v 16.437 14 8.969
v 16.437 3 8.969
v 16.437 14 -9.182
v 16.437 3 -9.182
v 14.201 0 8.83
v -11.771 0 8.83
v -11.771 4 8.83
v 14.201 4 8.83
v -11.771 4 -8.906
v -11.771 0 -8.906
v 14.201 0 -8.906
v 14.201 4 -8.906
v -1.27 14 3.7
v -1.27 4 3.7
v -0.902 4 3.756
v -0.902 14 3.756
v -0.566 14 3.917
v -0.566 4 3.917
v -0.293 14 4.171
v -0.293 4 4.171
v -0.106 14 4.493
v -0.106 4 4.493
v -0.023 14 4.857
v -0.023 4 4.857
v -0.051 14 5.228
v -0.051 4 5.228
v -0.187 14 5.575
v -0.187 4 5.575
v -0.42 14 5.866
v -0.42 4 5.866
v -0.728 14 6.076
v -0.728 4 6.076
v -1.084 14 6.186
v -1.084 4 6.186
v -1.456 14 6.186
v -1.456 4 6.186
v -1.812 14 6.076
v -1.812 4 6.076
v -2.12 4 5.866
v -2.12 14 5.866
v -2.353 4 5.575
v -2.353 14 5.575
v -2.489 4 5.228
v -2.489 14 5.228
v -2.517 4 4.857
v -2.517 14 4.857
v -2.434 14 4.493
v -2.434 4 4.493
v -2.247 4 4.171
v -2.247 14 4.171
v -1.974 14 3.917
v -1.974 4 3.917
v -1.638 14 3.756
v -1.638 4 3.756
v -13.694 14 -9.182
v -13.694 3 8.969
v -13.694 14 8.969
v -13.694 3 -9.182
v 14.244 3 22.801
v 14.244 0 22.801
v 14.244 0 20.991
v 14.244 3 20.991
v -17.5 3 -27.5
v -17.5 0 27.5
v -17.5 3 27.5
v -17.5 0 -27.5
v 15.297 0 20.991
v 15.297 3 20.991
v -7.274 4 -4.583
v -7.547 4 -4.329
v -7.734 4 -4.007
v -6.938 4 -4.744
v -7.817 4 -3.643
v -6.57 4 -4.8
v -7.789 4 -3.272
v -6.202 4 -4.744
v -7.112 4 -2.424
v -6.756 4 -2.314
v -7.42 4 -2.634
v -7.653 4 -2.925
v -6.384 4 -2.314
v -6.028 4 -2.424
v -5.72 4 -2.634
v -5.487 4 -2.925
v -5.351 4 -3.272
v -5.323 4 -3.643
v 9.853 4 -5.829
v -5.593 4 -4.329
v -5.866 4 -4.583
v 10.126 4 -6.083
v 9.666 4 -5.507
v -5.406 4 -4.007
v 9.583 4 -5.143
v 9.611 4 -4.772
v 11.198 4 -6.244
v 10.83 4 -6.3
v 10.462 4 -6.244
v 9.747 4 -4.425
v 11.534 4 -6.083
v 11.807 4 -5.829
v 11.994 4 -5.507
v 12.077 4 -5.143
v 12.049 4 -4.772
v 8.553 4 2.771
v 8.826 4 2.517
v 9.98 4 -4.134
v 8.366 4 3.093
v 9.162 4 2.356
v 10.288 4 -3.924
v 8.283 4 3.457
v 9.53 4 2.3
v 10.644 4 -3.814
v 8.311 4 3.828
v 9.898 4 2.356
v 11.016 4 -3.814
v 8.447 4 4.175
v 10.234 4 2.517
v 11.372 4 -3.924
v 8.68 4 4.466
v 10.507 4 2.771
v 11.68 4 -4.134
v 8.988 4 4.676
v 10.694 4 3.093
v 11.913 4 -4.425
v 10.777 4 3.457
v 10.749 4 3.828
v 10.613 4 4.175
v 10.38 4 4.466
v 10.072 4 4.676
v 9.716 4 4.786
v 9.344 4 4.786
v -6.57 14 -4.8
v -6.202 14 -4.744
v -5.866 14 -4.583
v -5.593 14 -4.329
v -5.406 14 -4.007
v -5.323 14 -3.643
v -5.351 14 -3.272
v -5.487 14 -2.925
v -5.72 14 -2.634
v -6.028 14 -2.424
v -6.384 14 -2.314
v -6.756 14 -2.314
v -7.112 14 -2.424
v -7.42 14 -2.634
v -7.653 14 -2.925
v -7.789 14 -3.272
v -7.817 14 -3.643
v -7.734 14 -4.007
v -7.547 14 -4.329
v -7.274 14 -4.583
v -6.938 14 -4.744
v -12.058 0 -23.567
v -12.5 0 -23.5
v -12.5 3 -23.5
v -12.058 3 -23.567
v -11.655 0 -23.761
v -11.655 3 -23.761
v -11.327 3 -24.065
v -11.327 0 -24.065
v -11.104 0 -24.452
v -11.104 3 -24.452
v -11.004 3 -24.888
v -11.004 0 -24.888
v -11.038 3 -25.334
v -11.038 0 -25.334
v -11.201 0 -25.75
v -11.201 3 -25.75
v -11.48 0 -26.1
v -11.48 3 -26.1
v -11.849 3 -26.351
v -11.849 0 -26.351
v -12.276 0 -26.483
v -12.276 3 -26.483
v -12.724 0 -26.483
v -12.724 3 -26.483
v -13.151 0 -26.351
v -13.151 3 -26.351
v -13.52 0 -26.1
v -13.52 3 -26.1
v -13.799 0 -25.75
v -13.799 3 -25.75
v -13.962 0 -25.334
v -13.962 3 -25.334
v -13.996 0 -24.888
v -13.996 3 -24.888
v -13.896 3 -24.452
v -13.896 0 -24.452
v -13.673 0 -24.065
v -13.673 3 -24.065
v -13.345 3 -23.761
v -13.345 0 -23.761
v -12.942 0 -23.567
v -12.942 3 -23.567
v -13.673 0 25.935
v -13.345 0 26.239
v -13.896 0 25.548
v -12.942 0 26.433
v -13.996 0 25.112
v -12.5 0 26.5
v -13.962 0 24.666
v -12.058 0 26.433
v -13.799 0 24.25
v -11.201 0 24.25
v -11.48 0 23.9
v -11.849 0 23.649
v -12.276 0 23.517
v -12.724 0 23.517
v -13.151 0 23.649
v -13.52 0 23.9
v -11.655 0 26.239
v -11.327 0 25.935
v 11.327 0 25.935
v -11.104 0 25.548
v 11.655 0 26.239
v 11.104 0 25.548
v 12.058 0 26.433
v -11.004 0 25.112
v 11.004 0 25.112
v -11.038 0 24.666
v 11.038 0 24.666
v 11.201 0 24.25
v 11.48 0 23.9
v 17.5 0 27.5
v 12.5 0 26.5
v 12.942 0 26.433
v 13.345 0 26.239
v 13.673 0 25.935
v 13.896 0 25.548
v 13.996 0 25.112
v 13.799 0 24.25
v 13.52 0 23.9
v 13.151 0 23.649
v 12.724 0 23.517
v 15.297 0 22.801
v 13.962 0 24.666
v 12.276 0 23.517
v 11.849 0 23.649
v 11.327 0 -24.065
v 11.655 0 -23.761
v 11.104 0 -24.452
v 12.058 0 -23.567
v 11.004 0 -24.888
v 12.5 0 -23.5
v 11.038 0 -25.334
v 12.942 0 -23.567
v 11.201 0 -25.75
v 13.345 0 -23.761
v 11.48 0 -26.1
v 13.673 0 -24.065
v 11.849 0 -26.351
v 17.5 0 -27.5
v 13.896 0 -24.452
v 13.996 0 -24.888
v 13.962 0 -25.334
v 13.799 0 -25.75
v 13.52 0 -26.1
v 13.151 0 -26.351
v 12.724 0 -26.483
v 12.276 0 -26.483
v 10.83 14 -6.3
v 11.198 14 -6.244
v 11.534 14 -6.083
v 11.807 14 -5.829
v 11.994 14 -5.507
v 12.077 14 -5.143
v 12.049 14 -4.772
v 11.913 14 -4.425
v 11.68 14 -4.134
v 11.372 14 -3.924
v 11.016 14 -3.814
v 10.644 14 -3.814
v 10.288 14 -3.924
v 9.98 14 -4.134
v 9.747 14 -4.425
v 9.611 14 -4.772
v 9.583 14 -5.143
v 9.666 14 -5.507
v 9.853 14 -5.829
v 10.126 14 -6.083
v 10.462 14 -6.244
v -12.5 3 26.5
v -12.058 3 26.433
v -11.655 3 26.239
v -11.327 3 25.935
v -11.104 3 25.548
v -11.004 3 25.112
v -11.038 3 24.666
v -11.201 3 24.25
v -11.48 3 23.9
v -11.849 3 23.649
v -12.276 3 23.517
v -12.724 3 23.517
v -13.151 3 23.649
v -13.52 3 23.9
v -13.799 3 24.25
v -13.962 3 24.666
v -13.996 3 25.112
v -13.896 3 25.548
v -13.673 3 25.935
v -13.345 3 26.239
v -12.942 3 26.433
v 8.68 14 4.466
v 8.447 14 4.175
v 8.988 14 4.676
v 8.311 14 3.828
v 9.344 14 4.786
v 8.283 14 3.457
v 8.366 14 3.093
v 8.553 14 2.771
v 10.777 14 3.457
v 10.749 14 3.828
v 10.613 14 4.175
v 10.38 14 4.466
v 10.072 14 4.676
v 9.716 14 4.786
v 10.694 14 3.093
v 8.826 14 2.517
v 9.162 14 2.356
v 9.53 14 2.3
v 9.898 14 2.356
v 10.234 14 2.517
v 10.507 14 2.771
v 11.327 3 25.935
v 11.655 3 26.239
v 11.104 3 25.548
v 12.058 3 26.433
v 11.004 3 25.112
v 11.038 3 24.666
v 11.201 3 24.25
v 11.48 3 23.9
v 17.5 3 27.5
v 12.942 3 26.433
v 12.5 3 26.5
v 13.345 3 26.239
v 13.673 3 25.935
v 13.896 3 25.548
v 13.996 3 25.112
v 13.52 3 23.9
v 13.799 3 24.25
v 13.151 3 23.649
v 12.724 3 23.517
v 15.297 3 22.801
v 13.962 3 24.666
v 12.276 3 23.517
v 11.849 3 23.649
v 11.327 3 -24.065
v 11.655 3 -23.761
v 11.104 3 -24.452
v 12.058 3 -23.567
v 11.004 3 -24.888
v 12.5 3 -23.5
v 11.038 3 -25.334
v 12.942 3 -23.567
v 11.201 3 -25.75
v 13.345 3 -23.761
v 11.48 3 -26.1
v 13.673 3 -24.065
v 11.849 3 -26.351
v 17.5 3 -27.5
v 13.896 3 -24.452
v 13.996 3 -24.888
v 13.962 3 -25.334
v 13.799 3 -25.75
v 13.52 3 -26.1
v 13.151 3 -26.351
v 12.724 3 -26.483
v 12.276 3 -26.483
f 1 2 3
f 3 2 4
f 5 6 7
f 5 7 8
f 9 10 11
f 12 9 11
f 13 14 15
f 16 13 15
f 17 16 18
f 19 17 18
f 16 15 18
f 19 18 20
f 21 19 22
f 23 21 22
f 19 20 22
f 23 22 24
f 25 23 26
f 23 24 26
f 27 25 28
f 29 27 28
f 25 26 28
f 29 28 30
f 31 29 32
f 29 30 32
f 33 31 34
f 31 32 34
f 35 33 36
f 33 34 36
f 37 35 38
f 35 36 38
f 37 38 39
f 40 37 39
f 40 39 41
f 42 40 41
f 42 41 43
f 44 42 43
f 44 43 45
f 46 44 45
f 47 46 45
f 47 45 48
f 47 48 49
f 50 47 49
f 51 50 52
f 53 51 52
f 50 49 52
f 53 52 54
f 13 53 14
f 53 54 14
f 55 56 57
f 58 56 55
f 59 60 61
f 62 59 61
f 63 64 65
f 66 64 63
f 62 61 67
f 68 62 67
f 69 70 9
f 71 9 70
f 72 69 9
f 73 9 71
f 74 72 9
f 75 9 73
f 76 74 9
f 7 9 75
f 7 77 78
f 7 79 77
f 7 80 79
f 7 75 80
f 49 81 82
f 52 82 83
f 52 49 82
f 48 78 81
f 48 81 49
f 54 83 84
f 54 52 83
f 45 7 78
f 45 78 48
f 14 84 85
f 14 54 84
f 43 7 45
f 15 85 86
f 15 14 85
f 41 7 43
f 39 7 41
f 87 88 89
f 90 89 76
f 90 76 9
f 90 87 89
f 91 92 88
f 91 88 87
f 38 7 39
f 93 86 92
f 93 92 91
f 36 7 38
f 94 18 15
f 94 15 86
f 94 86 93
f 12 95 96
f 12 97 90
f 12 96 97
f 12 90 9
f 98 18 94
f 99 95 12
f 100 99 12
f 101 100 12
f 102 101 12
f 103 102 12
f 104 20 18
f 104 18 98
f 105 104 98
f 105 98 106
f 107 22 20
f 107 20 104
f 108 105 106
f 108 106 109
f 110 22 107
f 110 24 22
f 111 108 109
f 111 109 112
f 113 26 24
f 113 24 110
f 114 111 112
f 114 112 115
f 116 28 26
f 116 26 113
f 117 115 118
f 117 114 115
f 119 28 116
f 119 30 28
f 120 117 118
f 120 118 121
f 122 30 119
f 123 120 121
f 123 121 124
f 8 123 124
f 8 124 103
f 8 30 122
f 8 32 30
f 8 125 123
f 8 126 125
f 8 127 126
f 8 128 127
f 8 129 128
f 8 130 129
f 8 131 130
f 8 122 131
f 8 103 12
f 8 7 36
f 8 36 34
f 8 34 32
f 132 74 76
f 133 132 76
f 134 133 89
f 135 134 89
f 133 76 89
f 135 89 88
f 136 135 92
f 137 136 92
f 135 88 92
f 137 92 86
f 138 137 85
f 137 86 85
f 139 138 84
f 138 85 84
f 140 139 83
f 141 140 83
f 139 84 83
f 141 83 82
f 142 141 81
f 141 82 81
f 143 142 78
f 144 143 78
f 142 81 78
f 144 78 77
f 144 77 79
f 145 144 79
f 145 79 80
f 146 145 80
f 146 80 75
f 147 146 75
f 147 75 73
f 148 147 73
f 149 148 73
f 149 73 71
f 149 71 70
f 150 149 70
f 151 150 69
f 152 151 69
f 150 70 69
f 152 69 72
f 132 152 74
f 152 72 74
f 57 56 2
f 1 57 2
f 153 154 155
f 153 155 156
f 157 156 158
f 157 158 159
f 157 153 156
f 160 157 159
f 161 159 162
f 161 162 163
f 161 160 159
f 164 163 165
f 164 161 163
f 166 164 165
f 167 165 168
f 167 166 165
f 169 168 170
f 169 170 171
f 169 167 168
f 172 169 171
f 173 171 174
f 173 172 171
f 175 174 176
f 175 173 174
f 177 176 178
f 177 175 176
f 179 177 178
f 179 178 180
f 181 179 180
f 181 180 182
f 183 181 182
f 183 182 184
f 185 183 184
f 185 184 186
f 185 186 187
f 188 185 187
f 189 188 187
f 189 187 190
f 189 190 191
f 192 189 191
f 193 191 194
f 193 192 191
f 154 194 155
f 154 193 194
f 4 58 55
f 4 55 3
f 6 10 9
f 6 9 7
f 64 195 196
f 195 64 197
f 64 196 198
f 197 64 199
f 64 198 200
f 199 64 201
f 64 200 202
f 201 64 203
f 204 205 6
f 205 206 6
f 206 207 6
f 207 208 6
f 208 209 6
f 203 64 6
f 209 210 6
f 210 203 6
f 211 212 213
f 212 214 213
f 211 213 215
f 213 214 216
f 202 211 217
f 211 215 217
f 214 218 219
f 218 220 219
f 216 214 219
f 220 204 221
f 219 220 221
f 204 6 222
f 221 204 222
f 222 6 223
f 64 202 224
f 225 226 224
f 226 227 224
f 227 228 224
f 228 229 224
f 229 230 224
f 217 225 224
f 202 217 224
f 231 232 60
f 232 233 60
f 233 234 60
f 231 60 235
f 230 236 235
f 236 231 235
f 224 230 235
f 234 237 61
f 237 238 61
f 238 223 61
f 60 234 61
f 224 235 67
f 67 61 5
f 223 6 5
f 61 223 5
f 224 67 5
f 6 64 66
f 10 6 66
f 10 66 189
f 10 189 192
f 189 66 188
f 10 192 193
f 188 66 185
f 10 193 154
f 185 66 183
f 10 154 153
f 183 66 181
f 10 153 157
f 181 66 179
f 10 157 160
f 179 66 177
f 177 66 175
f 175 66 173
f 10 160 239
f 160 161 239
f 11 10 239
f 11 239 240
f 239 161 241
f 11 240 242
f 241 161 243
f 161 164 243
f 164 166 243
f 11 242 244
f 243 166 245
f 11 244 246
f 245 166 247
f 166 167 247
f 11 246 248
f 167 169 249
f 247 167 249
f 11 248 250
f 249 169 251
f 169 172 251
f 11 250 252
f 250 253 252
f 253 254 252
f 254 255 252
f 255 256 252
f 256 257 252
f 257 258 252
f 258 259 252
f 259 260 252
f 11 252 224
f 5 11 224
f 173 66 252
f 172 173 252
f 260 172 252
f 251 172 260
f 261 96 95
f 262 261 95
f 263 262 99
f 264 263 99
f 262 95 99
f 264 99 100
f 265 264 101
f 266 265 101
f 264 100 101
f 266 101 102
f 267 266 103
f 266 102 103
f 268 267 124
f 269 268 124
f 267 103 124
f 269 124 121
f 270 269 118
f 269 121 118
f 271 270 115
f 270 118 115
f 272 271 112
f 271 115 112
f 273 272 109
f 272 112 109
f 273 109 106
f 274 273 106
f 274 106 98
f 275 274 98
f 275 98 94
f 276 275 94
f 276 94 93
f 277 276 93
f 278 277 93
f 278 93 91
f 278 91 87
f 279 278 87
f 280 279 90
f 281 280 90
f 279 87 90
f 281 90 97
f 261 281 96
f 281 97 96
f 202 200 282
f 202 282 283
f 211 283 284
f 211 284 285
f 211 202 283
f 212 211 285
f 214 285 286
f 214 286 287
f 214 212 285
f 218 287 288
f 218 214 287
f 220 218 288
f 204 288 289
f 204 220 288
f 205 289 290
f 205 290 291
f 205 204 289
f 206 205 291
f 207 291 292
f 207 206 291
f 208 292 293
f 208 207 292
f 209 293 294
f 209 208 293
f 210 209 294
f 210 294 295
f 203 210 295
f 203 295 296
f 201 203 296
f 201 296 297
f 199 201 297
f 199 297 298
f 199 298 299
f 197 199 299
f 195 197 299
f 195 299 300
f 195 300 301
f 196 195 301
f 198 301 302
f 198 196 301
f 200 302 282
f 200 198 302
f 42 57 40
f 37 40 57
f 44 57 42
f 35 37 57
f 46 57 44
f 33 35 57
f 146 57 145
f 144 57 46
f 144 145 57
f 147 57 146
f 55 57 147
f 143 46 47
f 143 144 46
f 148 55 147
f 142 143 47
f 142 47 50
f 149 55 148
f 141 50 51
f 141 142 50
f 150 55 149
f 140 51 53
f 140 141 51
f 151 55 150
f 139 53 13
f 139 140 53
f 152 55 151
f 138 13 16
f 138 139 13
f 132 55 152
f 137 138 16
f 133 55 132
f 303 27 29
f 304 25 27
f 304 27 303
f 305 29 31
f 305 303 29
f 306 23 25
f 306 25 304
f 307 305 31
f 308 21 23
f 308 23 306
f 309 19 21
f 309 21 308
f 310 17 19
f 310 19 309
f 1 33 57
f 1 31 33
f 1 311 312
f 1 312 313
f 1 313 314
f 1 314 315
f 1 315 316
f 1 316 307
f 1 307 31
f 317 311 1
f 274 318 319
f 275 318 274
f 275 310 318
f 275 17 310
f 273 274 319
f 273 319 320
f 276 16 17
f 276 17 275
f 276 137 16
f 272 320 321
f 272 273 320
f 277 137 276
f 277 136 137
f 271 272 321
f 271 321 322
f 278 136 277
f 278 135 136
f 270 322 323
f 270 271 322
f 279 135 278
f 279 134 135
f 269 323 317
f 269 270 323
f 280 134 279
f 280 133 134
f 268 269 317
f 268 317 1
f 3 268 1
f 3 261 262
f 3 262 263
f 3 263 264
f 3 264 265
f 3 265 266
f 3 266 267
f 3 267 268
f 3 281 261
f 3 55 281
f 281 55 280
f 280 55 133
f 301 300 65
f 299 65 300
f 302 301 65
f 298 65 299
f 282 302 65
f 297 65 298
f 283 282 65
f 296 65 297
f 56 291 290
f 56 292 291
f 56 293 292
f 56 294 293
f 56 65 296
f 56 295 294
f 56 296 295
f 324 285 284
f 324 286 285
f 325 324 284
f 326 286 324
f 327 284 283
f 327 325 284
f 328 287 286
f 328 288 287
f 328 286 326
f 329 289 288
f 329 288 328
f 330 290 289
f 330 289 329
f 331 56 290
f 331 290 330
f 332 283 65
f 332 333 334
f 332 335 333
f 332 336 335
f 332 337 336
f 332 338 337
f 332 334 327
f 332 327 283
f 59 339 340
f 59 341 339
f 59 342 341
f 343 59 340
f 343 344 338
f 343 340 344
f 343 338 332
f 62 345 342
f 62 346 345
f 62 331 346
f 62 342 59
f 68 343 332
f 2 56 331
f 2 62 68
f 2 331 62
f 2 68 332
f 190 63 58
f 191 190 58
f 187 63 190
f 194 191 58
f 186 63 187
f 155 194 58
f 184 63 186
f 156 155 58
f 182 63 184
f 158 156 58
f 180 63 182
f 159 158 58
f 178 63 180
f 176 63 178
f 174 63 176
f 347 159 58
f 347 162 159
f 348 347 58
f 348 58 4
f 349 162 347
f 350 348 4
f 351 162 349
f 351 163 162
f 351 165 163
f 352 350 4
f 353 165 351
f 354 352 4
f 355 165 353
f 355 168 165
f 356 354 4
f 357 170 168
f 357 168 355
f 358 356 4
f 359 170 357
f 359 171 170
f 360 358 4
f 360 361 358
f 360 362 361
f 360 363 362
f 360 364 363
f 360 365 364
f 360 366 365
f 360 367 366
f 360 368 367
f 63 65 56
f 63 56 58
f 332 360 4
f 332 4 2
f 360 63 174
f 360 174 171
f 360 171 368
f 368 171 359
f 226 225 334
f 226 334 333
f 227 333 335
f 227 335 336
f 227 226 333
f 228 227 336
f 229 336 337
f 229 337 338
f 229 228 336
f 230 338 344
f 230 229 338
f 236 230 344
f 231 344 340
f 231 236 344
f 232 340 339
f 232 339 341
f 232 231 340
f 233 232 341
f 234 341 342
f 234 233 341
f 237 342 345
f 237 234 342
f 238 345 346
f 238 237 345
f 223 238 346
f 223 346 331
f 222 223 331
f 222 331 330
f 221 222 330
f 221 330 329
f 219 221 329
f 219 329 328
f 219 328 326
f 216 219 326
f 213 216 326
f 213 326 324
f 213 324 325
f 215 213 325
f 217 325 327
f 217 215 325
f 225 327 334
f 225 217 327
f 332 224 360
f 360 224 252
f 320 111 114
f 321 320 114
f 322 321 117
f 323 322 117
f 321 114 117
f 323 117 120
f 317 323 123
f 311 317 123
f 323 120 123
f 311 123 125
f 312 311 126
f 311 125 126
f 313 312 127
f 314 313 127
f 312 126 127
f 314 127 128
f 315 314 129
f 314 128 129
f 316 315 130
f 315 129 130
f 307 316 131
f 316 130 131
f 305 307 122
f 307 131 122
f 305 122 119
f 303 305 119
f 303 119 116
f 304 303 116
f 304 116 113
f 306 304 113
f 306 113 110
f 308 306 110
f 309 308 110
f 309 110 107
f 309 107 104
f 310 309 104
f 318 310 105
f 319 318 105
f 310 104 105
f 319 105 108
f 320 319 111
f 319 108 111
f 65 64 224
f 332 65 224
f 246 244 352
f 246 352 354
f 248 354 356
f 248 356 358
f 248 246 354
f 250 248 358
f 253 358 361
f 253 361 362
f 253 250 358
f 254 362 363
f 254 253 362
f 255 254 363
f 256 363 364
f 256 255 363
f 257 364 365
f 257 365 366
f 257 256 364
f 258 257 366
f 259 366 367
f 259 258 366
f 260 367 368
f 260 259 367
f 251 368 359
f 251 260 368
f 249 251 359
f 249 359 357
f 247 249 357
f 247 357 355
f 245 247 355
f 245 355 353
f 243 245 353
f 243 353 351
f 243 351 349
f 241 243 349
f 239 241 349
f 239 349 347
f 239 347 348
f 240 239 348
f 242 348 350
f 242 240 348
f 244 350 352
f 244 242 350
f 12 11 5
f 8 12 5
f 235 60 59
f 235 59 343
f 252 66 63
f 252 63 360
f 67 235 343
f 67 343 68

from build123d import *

# Parameters (mm, degrees)
SKETCH1_W           = 35
SKETCH1_H           = 55
SKETCH1_R           = 1.5
SKETCH1_R_2         = 1.25
SKETCH1_W_2         = 1.053264104
SKETCH1_H_2         = 1.810086697
BOSS_EXTRUDE1_DEPTH = 3
SKETCH2_W           = 30.130506089
SKETCH2_H           = 18.151203477
BOSS_EXTRUDE2_DEPTH = 11
SKETCH3_R           = 1.25
CUT_EXTRUDE1_DEPTH  = 35.402034824
SKETCH4_W           = 25.972666726
SKETCH4_H           = 17.735623468
CUT_EXTRUDE2_DEPTH  = 4


with BuildPart() as part:
    # Sketch1 → Boss-Extrude1 (new body)
    with BuildSketch(Plane(origin=(0, 0, 0), x_dir=(1, 0, 0), z_dir=(0, 1, 0))):
        Rectangle(SKETCH1_W, SKETCH1_H)
        with Locations(Location((12.5, 25, 0), (0, 0, 270))):
            Circle(SKETCH1_R, mode=Mode.SUBTRACT)
        with Locations(Location((-12.5, 25, 0), (0, 0, 270))):
            Circle(SKETCH1_R, mode=Mode.SUBTRACT)
        with Locations(Location((12.5, -25, 0), (0, 0, 270))):
            Circle(SKETCH1_R, mode=Mode.SUBTRACT)
        with Locations(Location((-12.5, -25, 0), (0, 0, 270))):
            Circle(SKETCH1_R, mode=Mode.SUBTRACT)
        with Locations(Location((-1.27, -4.95, 0), (0, 0, 90))):
            Circle(SKETCH1_R_2, mode=Mode.SUBTRACT)
        with Locations(Location((-6.57, 3.55, 0), (0, 0, 90))):
            Circle(SKETCH1_R_2, mode=Mode.SUBTRACT)
        with Locations(Location((10.83, 5.05, 0), (0, 0, 90))):
            Circle(SKETCH1_R_2, mode=Mode.SUBTRACT)
        with Locations(Location((9.53, -3.55, 0), (0, 0, 90))):
            Circle(SKETCH1_R_2, mode=Mode.SUBTRACT)
        with Locations((14.770586435, -21.896230663)):
            Rectangle(SKETCH1_W_2, SKETCH1_H_2, mode=Mode.SUBTRACT)
    extrude(amount=BOSS_EXTRUDE1_DEPTH)

    # Sketch2 → Boss-Extrude2 (add)
    with BuildSketch(Plane(origin=(0, 3, 0), x_dir=(1, 0, 0), z_dir=(0, 1, 0))):
        with Locations((1.371677436, 0.106547158)):
            Rectangle(SKETCH2_W, SKETCH2_H)
    extrude(amount=BOSS_EXTRUDE2_DEPTH)

    # Sketch3 → Cut-Extrude1 (cut, through all)
    with BuildSketch(Plane.XZ.offset(-3)):
        with Locations(Location((-1.27, 4.95, 0), (0, 0, 270))):
            Circle(SKETCH3_R)
        with Locations(Location((-6.57, -3.55, 0), (0, 0, 270))):
            Circle(SKETCH3_R)
        with Locations(Location((9.53, 3.55, 0), (0, 0, 270))):
            Circle(SKETCH3_R)
        with Locations(Location((10.83, -5.05, 0), (0, 0, 270))):
            Circle(SKETCH3_R)
    extrude(amount=-CUT_EXTRUDE1_DEPTH, mode=Mode.SUBTRACT)

    # Sketch4 → Cut-Extrude2 (cut)
    with BuildSketch(Plane.XZ):
        with Locations((1.214862274, -0.038232514)):
            Rectangle(SKETCH4_W, SKETCH4_H)
    extrude(amount=-CUT_EXTRUDE2_DEPTH, mode=Mode.SUBTRACT)


solid = part.part
